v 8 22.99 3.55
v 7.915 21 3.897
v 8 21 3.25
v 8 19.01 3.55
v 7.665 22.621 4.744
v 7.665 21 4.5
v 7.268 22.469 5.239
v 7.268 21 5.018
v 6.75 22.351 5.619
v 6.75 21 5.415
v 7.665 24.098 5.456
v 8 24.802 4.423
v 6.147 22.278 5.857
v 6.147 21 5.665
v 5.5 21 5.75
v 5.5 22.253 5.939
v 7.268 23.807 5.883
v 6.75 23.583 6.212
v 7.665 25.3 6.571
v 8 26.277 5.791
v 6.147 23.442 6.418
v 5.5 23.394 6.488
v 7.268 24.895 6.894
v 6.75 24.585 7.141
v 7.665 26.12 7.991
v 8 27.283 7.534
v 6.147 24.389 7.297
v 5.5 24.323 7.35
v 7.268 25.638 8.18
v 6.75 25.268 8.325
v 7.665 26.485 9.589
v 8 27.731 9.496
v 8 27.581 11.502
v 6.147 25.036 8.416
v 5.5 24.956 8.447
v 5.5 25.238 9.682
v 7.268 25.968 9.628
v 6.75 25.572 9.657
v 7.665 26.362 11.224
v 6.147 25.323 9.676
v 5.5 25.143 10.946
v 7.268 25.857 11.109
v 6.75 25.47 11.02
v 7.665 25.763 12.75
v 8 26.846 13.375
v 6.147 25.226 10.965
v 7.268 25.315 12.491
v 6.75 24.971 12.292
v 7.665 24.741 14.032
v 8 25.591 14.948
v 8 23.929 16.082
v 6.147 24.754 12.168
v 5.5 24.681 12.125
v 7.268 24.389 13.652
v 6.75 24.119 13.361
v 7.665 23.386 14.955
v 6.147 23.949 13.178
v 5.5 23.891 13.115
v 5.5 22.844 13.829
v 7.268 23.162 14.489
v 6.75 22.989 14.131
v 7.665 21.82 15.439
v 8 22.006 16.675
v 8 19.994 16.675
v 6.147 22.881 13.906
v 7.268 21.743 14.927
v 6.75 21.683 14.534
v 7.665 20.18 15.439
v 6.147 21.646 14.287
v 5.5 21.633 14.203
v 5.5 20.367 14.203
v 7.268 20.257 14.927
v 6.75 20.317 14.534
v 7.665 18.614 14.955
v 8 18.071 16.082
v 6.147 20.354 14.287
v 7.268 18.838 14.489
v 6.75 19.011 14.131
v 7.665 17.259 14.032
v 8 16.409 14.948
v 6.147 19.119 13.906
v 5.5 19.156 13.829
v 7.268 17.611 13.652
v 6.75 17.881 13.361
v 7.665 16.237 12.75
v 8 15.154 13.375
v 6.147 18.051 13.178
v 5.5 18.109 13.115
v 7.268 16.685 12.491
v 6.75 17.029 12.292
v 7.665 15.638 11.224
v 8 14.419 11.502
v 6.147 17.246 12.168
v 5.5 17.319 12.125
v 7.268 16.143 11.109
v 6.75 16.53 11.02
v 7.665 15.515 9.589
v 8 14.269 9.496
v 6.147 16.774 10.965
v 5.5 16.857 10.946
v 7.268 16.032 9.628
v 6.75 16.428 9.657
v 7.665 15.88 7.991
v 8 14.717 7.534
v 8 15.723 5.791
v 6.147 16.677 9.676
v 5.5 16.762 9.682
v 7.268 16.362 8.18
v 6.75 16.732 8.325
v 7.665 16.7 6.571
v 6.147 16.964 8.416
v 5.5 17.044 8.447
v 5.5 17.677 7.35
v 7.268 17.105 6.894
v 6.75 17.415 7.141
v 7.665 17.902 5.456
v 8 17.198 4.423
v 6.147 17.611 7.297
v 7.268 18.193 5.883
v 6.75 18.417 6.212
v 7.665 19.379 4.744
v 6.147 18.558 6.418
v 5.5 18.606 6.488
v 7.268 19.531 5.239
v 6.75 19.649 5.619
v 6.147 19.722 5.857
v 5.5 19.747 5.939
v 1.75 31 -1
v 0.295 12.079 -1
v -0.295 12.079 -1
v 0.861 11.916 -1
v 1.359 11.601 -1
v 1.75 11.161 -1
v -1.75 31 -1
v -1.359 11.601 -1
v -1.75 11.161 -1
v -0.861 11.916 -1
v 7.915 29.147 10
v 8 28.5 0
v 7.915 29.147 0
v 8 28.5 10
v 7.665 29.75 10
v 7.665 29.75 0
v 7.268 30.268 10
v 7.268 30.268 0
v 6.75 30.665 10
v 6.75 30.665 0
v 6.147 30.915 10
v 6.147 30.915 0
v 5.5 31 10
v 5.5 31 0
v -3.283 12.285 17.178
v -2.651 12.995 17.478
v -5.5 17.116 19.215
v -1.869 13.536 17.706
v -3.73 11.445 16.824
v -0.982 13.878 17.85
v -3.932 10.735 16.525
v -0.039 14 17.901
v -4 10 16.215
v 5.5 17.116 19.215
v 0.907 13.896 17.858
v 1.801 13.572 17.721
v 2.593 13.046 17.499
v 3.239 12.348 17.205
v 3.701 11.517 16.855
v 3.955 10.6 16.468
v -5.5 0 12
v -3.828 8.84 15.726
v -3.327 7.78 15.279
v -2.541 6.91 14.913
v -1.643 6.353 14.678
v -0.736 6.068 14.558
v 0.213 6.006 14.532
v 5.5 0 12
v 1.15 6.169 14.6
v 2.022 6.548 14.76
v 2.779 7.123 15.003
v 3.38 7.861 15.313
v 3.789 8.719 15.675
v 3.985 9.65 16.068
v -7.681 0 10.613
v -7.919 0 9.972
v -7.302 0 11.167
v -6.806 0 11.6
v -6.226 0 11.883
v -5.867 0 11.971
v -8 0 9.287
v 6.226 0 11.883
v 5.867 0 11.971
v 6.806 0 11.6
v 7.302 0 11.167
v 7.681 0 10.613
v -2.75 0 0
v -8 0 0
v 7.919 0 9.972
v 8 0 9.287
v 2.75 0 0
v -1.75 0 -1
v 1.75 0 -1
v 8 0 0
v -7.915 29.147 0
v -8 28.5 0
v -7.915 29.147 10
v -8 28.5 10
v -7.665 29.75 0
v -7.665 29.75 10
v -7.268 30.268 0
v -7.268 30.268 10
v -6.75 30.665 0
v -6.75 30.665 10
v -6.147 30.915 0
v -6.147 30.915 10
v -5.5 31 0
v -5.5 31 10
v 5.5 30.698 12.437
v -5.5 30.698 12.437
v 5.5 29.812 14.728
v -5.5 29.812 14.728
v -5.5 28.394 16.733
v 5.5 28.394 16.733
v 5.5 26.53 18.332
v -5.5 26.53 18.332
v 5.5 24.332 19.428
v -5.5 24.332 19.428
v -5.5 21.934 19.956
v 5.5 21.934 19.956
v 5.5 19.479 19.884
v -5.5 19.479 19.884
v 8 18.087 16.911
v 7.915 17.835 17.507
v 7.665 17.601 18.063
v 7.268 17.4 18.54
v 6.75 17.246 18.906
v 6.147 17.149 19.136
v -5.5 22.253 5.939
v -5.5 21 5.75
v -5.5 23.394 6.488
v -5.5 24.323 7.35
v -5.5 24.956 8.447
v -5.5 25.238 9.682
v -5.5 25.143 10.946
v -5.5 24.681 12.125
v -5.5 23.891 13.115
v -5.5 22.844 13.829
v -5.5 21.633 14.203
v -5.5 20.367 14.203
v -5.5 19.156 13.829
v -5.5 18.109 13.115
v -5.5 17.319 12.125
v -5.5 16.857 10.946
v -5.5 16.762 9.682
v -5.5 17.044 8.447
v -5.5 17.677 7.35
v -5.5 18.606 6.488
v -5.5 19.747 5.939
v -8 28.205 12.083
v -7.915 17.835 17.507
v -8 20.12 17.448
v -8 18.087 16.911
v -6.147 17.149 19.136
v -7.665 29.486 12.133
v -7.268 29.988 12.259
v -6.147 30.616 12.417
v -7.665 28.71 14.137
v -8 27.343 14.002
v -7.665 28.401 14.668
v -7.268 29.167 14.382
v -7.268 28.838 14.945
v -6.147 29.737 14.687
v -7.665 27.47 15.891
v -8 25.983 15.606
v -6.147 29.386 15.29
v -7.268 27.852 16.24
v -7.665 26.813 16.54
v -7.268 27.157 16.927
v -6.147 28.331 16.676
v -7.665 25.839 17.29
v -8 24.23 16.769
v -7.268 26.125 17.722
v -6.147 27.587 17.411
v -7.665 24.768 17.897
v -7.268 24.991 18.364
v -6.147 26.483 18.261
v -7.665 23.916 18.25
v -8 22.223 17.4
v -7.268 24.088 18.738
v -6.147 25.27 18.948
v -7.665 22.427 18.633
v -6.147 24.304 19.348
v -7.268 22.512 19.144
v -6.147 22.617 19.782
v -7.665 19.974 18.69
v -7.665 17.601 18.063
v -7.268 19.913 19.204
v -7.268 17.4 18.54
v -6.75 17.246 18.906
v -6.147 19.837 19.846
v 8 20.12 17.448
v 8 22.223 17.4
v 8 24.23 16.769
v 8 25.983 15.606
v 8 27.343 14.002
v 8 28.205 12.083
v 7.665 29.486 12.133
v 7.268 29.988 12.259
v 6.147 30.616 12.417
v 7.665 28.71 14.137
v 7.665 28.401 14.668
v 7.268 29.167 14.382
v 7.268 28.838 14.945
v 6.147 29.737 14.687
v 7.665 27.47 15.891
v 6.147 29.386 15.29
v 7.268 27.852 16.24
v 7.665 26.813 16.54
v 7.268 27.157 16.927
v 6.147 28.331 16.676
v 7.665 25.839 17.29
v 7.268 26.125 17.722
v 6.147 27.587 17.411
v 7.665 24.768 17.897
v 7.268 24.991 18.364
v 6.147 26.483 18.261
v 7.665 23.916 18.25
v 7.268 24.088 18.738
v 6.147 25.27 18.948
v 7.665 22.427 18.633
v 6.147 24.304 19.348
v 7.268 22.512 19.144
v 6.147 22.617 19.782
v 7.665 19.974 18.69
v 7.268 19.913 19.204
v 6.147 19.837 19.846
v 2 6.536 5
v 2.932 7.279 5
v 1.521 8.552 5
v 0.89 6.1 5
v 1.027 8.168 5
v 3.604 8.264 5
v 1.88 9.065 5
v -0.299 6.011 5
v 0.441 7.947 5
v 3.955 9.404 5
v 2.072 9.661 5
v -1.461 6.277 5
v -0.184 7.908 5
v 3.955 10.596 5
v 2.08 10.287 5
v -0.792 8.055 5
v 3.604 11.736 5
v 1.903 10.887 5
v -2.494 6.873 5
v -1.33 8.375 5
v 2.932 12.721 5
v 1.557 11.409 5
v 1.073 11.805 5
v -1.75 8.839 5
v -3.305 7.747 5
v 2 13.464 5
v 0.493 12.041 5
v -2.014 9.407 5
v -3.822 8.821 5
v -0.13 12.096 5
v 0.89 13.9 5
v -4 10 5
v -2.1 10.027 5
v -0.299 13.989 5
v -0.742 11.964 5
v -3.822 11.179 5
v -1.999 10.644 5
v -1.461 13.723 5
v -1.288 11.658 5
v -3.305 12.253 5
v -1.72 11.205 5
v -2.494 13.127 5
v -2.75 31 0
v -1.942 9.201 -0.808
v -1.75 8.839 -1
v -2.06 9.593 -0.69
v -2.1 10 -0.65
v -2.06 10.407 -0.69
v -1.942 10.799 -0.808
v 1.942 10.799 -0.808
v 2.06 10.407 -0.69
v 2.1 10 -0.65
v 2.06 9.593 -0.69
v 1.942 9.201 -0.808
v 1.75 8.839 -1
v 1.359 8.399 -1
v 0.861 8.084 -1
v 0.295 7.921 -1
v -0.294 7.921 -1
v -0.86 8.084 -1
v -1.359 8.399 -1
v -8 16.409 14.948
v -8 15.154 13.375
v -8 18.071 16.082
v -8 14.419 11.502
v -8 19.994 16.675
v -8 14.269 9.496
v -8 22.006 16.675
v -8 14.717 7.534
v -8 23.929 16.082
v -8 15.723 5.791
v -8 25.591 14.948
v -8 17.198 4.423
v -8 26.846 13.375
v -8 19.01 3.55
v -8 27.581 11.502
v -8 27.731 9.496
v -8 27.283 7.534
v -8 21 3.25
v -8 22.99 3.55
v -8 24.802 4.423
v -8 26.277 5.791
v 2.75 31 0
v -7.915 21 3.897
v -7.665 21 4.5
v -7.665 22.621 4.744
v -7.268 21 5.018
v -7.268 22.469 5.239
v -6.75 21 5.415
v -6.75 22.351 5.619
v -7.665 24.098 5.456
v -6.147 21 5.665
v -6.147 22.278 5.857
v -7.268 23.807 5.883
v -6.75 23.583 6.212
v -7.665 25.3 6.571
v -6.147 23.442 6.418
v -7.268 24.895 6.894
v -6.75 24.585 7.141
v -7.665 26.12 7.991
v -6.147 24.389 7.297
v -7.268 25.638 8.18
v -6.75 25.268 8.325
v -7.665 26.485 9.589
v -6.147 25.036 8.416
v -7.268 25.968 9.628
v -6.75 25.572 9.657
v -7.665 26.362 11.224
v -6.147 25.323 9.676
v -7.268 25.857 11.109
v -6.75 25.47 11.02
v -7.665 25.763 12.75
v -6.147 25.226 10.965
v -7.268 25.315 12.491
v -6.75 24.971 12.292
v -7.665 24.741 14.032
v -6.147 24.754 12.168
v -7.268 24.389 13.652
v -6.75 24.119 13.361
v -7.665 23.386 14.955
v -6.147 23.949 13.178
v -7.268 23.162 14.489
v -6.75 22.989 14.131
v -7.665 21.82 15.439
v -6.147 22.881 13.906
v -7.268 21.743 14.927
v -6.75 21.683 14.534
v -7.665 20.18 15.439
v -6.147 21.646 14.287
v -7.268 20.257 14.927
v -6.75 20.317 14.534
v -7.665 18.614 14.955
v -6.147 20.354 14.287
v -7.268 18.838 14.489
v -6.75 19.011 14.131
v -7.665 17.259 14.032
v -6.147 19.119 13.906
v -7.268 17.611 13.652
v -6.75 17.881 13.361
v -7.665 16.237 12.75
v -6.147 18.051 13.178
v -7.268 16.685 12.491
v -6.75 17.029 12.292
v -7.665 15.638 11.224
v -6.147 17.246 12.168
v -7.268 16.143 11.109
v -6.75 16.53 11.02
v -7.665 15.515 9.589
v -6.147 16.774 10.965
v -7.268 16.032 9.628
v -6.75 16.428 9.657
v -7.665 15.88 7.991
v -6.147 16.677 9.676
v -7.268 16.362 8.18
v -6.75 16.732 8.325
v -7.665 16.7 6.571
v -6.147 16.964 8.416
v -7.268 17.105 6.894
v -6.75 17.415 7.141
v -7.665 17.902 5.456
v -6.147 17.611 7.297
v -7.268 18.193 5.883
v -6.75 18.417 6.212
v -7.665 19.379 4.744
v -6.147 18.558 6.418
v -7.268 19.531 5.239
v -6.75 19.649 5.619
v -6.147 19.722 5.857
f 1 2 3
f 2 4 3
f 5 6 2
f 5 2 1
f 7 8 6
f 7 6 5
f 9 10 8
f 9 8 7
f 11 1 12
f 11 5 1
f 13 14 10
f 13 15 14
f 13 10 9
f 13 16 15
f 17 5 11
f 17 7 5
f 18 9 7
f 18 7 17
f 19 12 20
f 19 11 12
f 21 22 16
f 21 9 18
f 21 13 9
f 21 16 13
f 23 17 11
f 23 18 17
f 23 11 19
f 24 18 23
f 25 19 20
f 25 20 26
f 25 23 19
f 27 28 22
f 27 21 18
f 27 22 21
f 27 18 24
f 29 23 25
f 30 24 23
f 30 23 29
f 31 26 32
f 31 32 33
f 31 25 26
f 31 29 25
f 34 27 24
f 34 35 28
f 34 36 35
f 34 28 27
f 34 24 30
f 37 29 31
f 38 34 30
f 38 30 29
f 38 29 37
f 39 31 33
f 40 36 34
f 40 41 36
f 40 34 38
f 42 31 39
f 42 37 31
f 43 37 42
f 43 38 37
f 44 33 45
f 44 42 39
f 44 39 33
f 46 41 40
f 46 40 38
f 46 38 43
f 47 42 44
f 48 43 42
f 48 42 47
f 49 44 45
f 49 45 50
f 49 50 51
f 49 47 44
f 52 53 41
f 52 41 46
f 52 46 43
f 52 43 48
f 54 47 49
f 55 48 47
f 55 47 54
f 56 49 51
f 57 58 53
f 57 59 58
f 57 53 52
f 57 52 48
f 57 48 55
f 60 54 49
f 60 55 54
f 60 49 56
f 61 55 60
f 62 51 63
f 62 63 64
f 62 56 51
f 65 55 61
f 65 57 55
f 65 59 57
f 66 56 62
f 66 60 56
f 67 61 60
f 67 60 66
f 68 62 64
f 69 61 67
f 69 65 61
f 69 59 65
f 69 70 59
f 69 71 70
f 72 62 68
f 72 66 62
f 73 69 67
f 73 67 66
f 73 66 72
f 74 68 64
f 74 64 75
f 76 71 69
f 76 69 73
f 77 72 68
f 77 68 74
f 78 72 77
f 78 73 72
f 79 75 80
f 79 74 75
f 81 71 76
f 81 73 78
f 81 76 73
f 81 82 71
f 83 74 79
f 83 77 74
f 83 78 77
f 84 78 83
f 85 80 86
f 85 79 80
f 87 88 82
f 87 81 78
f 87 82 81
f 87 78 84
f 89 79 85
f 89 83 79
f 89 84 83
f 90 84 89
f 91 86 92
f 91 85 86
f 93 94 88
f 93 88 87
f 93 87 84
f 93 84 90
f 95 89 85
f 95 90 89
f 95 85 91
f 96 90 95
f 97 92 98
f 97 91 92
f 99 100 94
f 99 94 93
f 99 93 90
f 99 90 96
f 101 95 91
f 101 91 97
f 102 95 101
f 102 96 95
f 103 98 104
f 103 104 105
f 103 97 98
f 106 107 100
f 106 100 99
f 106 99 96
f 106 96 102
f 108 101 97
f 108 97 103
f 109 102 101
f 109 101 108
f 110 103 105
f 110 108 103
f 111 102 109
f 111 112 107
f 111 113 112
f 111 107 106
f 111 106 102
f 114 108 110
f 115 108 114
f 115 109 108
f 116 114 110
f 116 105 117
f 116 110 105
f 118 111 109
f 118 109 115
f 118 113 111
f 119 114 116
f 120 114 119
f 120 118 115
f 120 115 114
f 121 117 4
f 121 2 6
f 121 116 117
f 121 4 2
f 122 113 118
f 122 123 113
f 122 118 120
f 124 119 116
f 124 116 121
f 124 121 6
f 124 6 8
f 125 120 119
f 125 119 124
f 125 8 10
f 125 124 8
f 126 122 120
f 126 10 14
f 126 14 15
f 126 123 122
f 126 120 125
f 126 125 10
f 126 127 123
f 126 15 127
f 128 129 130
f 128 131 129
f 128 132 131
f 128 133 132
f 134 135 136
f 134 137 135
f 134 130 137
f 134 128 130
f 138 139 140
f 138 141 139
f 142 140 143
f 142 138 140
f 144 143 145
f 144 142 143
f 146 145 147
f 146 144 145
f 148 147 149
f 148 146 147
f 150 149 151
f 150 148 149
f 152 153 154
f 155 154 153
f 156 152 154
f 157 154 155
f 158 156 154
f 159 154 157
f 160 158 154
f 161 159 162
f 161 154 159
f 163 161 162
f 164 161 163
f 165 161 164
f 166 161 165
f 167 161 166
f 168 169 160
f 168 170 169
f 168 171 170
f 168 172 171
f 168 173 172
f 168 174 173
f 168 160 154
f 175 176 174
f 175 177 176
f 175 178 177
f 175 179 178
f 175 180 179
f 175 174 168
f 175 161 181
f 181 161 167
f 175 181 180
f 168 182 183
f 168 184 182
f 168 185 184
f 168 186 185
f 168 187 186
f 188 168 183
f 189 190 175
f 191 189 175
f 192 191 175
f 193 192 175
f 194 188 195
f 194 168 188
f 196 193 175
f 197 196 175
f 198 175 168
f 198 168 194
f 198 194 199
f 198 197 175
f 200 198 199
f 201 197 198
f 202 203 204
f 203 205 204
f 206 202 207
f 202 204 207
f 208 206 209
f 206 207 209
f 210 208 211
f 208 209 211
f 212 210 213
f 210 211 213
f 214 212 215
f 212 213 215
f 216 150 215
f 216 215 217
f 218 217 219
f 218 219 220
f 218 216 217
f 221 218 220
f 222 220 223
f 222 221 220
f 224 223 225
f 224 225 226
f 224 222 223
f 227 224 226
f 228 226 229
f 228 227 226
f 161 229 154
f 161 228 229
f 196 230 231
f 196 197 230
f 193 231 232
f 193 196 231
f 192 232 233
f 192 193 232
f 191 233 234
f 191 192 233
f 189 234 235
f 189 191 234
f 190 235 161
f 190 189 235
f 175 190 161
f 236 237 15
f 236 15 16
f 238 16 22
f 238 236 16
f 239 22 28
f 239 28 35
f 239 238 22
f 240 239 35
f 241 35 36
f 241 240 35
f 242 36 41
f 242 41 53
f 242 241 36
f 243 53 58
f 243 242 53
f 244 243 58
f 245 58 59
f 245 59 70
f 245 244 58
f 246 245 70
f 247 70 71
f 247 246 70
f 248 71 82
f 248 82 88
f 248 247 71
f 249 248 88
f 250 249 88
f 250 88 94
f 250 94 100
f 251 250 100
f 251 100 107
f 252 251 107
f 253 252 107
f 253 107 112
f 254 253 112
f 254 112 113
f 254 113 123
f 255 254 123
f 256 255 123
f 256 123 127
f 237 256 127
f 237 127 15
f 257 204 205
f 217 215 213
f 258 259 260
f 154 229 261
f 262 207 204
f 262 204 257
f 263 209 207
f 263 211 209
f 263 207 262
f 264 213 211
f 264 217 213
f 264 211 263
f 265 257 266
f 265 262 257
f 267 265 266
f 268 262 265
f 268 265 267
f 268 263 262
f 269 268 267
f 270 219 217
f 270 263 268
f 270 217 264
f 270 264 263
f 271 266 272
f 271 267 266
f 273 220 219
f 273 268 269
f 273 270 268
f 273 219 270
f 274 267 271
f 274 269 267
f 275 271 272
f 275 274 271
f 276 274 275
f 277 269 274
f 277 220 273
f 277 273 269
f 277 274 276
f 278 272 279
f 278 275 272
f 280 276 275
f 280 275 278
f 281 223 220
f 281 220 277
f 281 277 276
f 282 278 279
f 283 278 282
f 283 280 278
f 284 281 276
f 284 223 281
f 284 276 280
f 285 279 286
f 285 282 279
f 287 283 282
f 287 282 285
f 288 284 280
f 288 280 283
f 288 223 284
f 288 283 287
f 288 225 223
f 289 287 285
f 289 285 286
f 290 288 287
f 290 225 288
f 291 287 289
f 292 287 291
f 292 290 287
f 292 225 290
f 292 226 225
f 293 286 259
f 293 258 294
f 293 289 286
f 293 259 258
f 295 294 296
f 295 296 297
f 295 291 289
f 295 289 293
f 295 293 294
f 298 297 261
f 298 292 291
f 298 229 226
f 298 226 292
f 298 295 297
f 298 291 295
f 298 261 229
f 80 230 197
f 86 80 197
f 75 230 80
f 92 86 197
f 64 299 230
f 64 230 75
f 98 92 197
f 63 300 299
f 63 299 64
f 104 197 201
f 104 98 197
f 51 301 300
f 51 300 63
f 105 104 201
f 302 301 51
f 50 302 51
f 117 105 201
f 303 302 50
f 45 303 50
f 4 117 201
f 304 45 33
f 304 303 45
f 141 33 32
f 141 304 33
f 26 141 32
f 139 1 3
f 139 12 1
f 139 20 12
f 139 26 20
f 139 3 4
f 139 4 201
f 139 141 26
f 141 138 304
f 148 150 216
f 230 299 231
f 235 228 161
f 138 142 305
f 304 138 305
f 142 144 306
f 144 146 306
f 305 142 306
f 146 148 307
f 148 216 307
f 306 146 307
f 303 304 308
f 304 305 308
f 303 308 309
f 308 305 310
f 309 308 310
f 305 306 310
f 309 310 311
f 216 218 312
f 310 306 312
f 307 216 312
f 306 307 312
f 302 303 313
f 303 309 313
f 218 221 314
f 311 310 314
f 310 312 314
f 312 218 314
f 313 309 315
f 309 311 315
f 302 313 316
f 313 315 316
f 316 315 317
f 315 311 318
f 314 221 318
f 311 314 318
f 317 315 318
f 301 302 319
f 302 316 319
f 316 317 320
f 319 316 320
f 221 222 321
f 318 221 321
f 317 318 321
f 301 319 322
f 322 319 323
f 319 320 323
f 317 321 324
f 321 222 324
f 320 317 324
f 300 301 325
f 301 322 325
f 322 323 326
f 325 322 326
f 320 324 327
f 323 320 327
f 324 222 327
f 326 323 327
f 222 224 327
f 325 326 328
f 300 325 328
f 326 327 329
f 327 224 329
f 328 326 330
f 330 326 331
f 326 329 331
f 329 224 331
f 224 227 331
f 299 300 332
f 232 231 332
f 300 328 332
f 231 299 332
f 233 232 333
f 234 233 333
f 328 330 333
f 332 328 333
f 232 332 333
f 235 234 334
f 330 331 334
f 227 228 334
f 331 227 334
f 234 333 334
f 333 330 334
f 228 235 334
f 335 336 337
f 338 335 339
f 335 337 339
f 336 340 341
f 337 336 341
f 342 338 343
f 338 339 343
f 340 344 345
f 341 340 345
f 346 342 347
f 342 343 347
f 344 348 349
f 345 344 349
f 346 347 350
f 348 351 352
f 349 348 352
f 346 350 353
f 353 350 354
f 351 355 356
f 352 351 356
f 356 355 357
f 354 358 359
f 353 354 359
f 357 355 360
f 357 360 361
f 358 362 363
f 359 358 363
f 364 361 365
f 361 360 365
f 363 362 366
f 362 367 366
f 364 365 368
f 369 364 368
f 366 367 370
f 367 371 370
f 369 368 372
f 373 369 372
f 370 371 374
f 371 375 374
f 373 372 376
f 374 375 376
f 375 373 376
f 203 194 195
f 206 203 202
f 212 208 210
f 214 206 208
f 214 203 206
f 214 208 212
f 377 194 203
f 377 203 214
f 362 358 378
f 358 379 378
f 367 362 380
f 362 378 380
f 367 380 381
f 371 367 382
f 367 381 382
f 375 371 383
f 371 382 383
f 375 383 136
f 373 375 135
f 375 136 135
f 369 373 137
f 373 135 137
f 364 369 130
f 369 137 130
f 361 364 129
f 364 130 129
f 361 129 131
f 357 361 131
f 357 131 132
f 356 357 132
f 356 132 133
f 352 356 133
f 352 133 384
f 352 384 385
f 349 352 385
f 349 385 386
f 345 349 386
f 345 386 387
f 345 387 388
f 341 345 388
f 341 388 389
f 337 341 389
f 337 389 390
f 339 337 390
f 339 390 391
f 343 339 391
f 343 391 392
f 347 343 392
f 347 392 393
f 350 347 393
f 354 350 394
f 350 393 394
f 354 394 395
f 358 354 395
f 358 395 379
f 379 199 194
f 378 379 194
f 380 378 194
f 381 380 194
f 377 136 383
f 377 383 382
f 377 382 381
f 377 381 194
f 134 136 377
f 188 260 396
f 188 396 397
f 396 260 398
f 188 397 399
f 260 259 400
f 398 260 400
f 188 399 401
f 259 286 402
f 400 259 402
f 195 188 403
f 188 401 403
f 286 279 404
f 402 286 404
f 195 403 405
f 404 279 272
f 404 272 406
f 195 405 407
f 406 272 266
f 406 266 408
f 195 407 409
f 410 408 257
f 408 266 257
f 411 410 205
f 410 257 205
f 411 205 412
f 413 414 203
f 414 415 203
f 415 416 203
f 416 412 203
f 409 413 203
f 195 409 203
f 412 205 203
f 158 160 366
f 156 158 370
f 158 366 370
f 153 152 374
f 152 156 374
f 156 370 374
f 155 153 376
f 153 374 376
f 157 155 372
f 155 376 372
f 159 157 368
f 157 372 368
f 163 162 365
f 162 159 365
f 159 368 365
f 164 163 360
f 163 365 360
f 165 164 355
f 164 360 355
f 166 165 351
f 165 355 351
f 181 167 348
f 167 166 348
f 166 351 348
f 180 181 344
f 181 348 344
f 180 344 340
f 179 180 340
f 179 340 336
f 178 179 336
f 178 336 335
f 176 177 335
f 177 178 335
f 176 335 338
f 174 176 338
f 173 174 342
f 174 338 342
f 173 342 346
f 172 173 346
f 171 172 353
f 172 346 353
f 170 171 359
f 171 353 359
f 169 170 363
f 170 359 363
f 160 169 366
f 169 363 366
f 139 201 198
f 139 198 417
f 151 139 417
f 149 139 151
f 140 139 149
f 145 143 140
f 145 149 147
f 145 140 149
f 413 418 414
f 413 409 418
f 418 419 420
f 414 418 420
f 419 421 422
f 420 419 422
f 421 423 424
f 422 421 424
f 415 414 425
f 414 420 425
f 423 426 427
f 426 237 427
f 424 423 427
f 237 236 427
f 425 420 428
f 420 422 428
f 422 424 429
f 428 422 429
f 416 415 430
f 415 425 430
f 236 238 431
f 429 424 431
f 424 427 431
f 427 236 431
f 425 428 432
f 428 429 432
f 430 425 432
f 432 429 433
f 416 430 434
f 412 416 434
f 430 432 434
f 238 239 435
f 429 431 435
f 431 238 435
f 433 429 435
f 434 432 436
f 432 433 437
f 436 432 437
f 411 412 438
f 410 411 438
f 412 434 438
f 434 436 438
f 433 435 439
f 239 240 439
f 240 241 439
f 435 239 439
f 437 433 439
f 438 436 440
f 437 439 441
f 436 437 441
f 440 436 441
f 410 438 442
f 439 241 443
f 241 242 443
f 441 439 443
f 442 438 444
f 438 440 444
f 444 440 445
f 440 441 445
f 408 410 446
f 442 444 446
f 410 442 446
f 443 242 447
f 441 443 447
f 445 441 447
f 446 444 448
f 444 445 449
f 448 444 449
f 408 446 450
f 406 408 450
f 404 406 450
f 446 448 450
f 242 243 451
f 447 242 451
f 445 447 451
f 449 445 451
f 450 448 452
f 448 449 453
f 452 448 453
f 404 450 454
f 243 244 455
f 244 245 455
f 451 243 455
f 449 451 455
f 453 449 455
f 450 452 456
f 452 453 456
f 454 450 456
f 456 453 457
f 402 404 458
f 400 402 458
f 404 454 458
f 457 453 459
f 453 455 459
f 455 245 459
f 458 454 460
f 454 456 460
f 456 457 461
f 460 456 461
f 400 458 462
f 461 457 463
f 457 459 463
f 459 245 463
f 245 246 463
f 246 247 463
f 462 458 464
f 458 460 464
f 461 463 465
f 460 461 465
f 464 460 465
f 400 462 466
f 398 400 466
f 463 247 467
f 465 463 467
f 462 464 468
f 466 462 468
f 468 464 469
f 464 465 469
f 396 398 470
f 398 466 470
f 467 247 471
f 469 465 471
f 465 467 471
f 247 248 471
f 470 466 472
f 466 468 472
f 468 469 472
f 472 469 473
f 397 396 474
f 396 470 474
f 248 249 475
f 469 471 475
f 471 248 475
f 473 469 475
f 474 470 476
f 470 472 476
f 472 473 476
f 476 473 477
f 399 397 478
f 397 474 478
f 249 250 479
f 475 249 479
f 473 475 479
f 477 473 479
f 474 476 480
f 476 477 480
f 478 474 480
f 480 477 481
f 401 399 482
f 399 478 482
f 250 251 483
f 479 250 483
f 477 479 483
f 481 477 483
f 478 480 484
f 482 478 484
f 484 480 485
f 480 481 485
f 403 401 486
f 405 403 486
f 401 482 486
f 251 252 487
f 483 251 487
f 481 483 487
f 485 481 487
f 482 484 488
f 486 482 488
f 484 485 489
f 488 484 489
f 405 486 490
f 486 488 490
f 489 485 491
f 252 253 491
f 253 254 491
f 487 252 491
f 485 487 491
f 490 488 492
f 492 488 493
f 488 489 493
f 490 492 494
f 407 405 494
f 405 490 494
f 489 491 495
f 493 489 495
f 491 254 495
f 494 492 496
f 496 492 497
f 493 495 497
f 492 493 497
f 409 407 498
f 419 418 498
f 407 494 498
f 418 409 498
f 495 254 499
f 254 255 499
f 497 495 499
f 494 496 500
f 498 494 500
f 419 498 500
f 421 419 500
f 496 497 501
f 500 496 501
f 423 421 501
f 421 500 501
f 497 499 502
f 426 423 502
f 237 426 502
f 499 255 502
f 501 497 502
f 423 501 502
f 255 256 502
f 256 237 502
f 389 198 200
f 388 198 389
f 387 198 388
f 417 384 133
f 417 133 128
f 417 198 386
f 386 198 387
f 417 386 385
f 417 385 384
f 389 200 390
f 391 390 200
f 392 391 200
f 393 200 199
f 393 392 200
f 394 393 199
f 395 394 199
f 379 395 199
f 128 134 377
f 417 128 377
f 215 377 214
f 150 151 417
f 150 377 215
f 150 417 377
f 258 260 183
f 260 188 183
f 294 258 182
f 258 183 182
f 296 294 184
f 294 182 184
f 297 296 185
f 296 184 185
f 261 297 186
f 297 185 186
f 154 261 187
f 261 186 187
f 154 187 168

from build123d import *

# Parameters (mm, degrees)
ESQUISSE1_R             = 4.25
BOSS_EXTRU_1_DEPTH      = 8
ESQUISSE2_W             = 5.5
ESQUISSE2_H             = 31
BOSS_EXTRU_2_DEPTH      = 1
CHANFREIN1_SIZE         = 1
ESQUISSE3_R             = 2.1
ENL_V_MAT_EXTRU_1_DEPTH = 39.288379438
ENL_V_START             = -5
ESQUISSE4_R             = 4
ENL_V_MAT_EXTRU_2_DEPTH = 33.749172176
CONG_1_R                = 2.5


with BuildPart() as part:
    # Esquisse1 → Boss.-Extru.1 (new, symmetric)
    with BuildSketch(Plane(origin=(0, 0, 0), x_dir=(0, 0, -1), z_dir=(1, 0, 0))):
        with BuildLine():
            Line((0, 0), (0, 31))
            Line((0, 31), (-10, 31))
            ThreePointArc((-10, 31), (-18.331958567, 26.529779962), (-19.214779507, 17.115693286))
            Line((-19.214779507, 17.115693286), (-12, 0))
            Line((-12, 0), (0, 0))
        make_face()
        with Locations((-10, 21)):
            Circle(ESQUISSE1_R, mode=Mode.SUBTRACT)
    extrude(amount=BOSS_EXTRU_1_DEPTH, both=True)

    # Esquisse2 → Boss.-Extru.2 (add)
    with BuildSketch(Plane(origin=(0, 0, 0), x_dir=(-1, 0, 0), z_dir=(0, 0, -1))):
        with Locations((0, 15.5)):
            Rectangle(ESQUISSE2_W, ESQUISSE2_H)
    extrude(amount=BOSS_EXTRU_2_DEPTH)

    # Chanfrein1
    chanfrein1_edges = [part.edges().sort_by_distance(p)[0] for p in [
        (-2.75, 15.5, -1),
        (2.75, 15.5, -1),
    ]]
    chamfer(chanfrein1_edges, length=CHANFREIN1_SIZE - 0.0001)  # a hair under: the kernel refuses the full size

    # Esquisse3 → Enlèv. mat.-Extru.1 (cut, through all)
    with BuildSketch(Plane(origin=(0, 0, -1), x_dir=(-1, 0, 0), z_dir=(0, 0, -1))):
        with Locations(Location((0, 10, 0), (0, 0, 326.442690238))):
            Circle(ESQUISSE3_R)
    extrude(amount=-ENL_V_MAT_EXTRU_1_DEPTH, mode=Mode.SUBTRACT)

    # Esquisse4 → Enlèv. mat.-Extru.2 (cut, through all)
    with BuildSketch(Plane(origin=(0, 0, 0), x_dir=(-1, 0, 0), z_dir=(0, 0, -1)).offset(ENL_V_START)):
        with Locations((0, 10)):
            Circle(ESQUISSE4_R)
    extrude(amount=-ENL_V_MAT_EXTRU_2_DEPTH, mode=Mode.SUBTRACT)

    # Congé1
    cong_1_edges = [part.edges().sort_by_distance(p)[0] for p in [
        (8, 31, 5),
        (8, 26.529779962, 18.331958567),
        (-8, 21, 14.25),
        (8, 21, 14.25),
        (8, 8.557846643, 15.607389753),
        (-8, 8.557846643, 15.607389753),
        (-8, 26.529779962, 18.331958567),
        (-8, 31, 5),
    ]]
    fillet(cong_1_edges, radius=CONG_1_R)


solid = part.part
